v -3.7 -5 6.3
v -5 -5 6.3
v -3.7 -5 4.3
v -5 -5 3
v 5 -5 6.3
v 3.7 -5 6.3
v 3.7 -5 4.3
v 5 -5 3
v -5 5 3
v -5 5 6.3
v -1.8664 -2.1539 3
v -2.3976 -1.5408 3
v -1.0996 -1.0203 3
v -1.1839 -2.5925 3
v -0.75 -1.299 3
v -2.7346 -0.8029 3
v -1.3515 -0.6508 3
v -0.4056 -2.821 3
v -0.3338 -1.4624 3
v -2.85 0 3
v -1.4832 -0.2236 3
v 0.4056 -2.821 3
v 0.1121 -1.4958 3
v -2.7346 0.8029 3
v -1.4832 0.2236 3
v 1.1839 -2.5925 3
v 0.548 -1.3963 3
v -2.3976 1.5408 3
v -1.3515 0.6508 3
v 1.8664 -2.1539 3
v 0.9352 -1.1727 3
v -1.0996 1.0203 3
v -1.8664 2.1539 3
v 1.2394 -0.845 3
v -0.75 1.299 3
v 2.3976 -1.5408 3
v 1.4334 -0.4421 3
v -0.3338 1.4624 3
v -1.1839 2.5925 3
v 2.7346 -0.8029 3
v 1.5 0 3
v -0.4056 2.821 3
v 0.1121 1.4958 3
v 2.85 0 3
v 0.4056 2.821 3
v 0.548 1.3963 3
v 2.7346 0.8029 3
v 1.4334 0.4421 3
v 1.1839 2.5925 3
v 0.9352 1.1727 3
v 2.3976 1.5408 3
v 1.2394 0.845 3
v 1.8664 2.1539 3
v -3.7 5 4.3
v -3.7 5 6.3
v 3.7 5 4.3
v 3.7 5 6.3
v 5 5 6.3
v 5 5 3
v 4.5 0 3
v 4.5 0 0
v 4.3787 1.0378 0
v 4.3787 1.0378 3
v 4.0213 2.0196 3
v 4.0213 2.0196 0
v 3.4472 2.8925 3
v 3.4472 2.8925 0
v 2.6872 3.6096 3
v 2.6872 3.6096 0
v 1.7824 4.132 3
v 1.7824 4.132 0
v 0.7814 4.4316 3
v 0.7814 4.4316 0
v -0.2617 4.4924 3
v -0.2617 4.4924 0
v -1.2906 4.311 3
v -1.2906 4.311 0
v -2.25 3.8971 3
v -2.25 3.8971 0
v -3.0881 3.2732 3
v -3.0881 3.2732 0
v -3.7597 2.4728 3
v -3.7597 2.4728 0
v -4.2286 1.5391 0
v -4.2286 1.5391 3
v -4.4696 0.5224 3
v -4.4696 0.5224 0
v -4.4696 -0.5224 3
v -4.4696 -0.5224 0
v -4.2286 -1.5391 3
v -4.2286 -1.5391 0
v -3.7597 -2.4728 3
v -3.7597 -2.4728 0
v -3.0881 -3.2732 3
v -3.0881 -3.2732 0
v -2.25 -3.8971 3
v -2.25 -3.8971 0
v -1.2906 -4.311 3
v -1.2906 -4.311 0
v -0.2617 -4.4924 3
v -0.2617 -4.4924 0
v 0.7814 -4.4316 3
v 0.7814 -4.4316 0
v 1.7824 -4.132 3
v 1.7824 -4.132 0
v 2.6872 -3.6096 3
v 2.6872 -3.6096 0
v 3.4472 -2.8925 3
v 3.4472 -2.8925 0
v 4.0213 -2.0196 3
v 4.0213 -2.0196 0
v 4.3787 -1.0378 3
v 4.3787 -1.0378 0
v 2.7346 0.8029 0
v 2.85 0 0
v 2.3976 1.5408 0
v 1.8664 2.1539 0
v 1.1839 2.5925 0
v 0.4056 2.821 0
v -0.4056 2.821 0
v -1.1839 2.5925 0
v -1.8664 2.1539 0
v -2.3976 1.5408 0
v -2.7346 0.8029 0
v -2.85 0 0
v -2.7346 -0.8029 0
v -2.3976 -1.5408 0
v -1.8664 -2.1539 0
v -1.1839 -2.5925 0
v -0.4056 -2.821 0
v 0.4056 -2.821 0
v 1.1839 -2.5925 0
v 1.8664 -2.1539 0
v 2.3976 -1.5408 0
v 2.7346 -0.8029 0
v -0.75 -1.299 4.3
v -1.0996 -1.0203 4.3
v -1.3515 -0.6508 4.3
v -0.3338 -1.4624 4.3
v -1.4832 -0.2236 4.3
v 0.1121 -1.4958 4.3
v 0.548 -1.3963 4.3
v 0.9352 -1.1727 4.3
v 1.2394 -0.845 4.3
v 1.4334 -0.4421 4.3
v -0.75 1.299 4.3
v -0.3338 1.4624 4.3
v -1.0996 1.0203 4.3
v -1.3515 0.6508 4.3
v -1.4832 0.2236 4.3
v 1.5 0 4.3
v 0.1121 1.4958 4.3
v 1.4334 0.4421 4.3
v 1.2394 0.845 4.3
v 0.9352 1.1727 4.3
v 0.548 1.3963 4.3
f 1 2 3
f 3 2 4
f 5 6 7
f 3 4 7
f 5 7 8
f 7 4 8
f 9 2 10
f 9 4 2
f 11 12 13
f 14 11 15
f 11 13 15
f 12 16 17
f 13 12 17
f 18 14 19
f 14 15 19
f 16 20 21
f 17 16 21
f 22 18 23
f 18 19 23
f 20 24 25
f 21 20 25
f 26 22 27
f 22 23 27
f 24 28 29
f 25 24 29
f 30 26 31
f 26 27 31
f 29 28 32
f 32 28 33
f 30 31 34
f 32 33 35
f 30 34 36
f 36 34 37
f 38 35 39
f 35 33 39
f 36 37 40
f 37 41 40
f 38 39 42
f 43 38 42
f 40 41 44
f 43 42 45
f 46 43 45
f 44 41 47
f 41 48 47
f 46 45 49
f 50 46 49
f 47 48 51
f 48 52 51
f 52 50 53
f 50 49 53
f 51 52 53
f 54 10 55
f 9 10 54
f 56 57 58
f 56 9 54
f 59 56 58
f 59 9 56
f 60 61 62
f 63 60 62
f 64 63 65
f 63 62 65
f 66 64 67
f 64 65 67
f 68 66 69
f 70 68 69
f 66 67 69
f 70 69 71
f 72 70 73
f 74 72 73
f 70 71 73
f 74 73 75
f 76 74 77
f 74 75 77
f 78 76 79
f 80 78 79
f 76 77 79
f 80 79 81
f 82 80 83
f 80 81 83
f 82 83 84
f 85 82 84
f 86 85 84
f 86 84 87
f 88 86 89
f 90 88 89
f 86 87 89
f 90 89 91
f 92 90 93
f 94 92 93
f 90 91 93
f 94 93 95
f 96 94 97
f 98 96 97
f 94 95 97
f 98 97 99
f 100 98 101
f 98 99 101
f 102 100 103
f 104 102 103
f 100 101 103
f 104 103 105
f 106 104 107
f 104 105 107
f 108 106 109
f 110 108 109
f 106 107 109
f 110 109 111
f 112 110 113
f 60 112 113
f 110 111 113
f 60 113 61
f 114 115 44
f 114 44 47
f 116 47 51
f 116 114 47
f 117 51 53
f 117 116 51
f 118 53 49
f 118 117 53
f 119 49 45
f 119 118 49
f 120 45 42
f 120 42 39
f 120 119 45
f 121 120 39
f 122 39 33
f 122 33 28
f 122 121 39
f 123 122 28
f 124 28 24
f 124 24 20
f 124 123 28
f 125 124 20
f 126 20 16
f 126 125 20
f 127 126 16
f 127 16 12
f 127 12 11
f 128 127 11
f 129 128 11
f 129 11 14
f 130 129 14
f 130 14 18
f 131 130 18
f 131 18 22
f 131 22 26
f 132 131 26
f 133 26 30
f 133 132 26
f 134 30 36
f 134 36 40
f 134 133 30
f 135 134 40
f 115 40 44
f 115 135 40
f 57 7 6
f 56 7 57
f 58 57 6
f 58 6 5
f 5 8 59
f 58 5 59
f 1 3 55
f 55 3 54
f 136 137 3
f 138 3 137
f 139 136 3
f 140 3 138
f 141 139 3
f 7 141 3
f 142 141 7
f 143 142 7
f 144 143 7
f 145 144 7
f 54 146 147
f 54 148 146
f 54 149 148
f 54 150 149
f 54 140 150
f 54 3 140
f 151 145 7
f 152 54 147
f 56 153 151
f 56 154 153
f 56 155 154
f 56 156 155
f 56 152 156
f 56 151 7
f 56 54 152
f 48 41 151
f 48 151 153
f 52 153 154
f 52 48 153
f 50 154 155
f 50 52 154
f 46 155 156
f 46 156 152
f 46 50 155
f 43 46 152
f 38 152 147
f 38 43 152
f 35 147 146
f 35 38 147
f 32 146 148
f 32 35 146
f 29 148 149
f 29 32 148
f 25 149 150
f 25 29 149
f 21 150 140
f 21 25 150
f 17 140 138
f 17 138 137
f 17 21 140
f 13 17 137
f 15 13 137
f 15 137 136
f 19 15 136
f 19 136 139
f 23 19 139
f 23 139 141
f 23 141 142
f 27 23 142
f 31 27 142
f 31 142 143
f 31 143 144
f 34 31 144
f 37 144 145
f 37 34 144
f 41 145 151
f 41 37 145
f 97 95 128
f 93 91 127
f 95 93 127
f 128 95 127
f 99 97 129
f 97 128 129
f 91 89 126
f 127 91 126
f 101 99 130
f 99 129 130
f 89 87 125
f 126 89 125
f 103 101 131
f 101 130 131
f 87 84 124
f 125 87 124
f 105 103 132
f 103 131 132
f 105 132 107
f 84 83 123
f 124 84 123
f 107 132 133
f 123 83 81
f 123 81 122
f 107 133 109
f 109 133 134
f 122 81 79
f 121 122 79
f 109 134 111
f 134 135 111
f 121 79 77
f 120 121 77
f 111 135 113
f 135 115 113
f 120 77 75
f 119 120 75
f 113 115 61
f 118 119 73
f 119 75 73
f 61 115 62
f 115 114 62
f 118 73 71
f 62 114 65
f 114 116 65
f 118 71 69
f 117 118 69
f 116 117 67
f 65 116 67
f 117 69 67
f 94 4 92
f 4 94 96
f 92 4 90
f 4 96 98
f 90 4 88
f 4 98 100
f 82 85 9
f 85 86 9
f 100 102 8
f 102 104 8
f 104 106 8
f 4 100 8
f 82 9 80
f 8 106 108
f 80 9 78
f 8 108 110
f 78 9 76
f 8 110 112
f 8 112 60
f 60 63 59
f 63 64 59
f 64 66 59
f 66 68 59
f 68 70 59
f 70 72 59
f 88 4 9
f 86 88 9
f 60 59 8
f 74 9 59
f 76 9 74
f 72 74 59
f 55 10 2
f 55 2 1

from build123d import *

# Parameters (mm, degrees)
SKETCH1_R              = 4.5
SKETCH1_R_2            = 2.85
MAIN_AXIS_DEPTH        = 3
SKETCH2_W              = 10
SKETCH2_H              = 10
SKETCH2_R              = 1.5
BASE_OF_RECTAGLE_DEPTH = 1.3
SKETCH3_W              = 1.3
SKETCH3_H              = 10
PULLEY_SUPPORT_DEPTH   = 2


with BuildPart() as part:
    # Sketch1 → Main Axis (new body)
    with BuildSketch(Plane.XY):
        Circle(SKETCH1_R)
        Circle(SKETCH1_R_2, mode=Mode.SUBTRACT)
    extrude(amount=MAIN_AXIS_DEPTH)

    # Sketch2 → Base of Rectagle (add)
    with BuildSketch(Plane.XY.offset(3)):
        Rectangle(SKETCH2_W, SKETCH2_H)
        Circle(SKETCH2_R, mode=Mode.SUBTRACT)
    extrude(amount=BASE_OF_RECTAGLE_DEPTH)

    # Sketch3 → Pulley Support (add)
    with BuildSketch(Plane.XY.offset(4.3)):
        with Locations((-4.35, 0)):
            Rectangle(SKETCH3_W, SKETCH3_H)
        with Locations((4.35, 0)):
            Rectangle(SKETCH3_W, SKETCH3_H)
    extrude(amount=PULLEY_SUPPORT_DEPTH)


solid = part.part
